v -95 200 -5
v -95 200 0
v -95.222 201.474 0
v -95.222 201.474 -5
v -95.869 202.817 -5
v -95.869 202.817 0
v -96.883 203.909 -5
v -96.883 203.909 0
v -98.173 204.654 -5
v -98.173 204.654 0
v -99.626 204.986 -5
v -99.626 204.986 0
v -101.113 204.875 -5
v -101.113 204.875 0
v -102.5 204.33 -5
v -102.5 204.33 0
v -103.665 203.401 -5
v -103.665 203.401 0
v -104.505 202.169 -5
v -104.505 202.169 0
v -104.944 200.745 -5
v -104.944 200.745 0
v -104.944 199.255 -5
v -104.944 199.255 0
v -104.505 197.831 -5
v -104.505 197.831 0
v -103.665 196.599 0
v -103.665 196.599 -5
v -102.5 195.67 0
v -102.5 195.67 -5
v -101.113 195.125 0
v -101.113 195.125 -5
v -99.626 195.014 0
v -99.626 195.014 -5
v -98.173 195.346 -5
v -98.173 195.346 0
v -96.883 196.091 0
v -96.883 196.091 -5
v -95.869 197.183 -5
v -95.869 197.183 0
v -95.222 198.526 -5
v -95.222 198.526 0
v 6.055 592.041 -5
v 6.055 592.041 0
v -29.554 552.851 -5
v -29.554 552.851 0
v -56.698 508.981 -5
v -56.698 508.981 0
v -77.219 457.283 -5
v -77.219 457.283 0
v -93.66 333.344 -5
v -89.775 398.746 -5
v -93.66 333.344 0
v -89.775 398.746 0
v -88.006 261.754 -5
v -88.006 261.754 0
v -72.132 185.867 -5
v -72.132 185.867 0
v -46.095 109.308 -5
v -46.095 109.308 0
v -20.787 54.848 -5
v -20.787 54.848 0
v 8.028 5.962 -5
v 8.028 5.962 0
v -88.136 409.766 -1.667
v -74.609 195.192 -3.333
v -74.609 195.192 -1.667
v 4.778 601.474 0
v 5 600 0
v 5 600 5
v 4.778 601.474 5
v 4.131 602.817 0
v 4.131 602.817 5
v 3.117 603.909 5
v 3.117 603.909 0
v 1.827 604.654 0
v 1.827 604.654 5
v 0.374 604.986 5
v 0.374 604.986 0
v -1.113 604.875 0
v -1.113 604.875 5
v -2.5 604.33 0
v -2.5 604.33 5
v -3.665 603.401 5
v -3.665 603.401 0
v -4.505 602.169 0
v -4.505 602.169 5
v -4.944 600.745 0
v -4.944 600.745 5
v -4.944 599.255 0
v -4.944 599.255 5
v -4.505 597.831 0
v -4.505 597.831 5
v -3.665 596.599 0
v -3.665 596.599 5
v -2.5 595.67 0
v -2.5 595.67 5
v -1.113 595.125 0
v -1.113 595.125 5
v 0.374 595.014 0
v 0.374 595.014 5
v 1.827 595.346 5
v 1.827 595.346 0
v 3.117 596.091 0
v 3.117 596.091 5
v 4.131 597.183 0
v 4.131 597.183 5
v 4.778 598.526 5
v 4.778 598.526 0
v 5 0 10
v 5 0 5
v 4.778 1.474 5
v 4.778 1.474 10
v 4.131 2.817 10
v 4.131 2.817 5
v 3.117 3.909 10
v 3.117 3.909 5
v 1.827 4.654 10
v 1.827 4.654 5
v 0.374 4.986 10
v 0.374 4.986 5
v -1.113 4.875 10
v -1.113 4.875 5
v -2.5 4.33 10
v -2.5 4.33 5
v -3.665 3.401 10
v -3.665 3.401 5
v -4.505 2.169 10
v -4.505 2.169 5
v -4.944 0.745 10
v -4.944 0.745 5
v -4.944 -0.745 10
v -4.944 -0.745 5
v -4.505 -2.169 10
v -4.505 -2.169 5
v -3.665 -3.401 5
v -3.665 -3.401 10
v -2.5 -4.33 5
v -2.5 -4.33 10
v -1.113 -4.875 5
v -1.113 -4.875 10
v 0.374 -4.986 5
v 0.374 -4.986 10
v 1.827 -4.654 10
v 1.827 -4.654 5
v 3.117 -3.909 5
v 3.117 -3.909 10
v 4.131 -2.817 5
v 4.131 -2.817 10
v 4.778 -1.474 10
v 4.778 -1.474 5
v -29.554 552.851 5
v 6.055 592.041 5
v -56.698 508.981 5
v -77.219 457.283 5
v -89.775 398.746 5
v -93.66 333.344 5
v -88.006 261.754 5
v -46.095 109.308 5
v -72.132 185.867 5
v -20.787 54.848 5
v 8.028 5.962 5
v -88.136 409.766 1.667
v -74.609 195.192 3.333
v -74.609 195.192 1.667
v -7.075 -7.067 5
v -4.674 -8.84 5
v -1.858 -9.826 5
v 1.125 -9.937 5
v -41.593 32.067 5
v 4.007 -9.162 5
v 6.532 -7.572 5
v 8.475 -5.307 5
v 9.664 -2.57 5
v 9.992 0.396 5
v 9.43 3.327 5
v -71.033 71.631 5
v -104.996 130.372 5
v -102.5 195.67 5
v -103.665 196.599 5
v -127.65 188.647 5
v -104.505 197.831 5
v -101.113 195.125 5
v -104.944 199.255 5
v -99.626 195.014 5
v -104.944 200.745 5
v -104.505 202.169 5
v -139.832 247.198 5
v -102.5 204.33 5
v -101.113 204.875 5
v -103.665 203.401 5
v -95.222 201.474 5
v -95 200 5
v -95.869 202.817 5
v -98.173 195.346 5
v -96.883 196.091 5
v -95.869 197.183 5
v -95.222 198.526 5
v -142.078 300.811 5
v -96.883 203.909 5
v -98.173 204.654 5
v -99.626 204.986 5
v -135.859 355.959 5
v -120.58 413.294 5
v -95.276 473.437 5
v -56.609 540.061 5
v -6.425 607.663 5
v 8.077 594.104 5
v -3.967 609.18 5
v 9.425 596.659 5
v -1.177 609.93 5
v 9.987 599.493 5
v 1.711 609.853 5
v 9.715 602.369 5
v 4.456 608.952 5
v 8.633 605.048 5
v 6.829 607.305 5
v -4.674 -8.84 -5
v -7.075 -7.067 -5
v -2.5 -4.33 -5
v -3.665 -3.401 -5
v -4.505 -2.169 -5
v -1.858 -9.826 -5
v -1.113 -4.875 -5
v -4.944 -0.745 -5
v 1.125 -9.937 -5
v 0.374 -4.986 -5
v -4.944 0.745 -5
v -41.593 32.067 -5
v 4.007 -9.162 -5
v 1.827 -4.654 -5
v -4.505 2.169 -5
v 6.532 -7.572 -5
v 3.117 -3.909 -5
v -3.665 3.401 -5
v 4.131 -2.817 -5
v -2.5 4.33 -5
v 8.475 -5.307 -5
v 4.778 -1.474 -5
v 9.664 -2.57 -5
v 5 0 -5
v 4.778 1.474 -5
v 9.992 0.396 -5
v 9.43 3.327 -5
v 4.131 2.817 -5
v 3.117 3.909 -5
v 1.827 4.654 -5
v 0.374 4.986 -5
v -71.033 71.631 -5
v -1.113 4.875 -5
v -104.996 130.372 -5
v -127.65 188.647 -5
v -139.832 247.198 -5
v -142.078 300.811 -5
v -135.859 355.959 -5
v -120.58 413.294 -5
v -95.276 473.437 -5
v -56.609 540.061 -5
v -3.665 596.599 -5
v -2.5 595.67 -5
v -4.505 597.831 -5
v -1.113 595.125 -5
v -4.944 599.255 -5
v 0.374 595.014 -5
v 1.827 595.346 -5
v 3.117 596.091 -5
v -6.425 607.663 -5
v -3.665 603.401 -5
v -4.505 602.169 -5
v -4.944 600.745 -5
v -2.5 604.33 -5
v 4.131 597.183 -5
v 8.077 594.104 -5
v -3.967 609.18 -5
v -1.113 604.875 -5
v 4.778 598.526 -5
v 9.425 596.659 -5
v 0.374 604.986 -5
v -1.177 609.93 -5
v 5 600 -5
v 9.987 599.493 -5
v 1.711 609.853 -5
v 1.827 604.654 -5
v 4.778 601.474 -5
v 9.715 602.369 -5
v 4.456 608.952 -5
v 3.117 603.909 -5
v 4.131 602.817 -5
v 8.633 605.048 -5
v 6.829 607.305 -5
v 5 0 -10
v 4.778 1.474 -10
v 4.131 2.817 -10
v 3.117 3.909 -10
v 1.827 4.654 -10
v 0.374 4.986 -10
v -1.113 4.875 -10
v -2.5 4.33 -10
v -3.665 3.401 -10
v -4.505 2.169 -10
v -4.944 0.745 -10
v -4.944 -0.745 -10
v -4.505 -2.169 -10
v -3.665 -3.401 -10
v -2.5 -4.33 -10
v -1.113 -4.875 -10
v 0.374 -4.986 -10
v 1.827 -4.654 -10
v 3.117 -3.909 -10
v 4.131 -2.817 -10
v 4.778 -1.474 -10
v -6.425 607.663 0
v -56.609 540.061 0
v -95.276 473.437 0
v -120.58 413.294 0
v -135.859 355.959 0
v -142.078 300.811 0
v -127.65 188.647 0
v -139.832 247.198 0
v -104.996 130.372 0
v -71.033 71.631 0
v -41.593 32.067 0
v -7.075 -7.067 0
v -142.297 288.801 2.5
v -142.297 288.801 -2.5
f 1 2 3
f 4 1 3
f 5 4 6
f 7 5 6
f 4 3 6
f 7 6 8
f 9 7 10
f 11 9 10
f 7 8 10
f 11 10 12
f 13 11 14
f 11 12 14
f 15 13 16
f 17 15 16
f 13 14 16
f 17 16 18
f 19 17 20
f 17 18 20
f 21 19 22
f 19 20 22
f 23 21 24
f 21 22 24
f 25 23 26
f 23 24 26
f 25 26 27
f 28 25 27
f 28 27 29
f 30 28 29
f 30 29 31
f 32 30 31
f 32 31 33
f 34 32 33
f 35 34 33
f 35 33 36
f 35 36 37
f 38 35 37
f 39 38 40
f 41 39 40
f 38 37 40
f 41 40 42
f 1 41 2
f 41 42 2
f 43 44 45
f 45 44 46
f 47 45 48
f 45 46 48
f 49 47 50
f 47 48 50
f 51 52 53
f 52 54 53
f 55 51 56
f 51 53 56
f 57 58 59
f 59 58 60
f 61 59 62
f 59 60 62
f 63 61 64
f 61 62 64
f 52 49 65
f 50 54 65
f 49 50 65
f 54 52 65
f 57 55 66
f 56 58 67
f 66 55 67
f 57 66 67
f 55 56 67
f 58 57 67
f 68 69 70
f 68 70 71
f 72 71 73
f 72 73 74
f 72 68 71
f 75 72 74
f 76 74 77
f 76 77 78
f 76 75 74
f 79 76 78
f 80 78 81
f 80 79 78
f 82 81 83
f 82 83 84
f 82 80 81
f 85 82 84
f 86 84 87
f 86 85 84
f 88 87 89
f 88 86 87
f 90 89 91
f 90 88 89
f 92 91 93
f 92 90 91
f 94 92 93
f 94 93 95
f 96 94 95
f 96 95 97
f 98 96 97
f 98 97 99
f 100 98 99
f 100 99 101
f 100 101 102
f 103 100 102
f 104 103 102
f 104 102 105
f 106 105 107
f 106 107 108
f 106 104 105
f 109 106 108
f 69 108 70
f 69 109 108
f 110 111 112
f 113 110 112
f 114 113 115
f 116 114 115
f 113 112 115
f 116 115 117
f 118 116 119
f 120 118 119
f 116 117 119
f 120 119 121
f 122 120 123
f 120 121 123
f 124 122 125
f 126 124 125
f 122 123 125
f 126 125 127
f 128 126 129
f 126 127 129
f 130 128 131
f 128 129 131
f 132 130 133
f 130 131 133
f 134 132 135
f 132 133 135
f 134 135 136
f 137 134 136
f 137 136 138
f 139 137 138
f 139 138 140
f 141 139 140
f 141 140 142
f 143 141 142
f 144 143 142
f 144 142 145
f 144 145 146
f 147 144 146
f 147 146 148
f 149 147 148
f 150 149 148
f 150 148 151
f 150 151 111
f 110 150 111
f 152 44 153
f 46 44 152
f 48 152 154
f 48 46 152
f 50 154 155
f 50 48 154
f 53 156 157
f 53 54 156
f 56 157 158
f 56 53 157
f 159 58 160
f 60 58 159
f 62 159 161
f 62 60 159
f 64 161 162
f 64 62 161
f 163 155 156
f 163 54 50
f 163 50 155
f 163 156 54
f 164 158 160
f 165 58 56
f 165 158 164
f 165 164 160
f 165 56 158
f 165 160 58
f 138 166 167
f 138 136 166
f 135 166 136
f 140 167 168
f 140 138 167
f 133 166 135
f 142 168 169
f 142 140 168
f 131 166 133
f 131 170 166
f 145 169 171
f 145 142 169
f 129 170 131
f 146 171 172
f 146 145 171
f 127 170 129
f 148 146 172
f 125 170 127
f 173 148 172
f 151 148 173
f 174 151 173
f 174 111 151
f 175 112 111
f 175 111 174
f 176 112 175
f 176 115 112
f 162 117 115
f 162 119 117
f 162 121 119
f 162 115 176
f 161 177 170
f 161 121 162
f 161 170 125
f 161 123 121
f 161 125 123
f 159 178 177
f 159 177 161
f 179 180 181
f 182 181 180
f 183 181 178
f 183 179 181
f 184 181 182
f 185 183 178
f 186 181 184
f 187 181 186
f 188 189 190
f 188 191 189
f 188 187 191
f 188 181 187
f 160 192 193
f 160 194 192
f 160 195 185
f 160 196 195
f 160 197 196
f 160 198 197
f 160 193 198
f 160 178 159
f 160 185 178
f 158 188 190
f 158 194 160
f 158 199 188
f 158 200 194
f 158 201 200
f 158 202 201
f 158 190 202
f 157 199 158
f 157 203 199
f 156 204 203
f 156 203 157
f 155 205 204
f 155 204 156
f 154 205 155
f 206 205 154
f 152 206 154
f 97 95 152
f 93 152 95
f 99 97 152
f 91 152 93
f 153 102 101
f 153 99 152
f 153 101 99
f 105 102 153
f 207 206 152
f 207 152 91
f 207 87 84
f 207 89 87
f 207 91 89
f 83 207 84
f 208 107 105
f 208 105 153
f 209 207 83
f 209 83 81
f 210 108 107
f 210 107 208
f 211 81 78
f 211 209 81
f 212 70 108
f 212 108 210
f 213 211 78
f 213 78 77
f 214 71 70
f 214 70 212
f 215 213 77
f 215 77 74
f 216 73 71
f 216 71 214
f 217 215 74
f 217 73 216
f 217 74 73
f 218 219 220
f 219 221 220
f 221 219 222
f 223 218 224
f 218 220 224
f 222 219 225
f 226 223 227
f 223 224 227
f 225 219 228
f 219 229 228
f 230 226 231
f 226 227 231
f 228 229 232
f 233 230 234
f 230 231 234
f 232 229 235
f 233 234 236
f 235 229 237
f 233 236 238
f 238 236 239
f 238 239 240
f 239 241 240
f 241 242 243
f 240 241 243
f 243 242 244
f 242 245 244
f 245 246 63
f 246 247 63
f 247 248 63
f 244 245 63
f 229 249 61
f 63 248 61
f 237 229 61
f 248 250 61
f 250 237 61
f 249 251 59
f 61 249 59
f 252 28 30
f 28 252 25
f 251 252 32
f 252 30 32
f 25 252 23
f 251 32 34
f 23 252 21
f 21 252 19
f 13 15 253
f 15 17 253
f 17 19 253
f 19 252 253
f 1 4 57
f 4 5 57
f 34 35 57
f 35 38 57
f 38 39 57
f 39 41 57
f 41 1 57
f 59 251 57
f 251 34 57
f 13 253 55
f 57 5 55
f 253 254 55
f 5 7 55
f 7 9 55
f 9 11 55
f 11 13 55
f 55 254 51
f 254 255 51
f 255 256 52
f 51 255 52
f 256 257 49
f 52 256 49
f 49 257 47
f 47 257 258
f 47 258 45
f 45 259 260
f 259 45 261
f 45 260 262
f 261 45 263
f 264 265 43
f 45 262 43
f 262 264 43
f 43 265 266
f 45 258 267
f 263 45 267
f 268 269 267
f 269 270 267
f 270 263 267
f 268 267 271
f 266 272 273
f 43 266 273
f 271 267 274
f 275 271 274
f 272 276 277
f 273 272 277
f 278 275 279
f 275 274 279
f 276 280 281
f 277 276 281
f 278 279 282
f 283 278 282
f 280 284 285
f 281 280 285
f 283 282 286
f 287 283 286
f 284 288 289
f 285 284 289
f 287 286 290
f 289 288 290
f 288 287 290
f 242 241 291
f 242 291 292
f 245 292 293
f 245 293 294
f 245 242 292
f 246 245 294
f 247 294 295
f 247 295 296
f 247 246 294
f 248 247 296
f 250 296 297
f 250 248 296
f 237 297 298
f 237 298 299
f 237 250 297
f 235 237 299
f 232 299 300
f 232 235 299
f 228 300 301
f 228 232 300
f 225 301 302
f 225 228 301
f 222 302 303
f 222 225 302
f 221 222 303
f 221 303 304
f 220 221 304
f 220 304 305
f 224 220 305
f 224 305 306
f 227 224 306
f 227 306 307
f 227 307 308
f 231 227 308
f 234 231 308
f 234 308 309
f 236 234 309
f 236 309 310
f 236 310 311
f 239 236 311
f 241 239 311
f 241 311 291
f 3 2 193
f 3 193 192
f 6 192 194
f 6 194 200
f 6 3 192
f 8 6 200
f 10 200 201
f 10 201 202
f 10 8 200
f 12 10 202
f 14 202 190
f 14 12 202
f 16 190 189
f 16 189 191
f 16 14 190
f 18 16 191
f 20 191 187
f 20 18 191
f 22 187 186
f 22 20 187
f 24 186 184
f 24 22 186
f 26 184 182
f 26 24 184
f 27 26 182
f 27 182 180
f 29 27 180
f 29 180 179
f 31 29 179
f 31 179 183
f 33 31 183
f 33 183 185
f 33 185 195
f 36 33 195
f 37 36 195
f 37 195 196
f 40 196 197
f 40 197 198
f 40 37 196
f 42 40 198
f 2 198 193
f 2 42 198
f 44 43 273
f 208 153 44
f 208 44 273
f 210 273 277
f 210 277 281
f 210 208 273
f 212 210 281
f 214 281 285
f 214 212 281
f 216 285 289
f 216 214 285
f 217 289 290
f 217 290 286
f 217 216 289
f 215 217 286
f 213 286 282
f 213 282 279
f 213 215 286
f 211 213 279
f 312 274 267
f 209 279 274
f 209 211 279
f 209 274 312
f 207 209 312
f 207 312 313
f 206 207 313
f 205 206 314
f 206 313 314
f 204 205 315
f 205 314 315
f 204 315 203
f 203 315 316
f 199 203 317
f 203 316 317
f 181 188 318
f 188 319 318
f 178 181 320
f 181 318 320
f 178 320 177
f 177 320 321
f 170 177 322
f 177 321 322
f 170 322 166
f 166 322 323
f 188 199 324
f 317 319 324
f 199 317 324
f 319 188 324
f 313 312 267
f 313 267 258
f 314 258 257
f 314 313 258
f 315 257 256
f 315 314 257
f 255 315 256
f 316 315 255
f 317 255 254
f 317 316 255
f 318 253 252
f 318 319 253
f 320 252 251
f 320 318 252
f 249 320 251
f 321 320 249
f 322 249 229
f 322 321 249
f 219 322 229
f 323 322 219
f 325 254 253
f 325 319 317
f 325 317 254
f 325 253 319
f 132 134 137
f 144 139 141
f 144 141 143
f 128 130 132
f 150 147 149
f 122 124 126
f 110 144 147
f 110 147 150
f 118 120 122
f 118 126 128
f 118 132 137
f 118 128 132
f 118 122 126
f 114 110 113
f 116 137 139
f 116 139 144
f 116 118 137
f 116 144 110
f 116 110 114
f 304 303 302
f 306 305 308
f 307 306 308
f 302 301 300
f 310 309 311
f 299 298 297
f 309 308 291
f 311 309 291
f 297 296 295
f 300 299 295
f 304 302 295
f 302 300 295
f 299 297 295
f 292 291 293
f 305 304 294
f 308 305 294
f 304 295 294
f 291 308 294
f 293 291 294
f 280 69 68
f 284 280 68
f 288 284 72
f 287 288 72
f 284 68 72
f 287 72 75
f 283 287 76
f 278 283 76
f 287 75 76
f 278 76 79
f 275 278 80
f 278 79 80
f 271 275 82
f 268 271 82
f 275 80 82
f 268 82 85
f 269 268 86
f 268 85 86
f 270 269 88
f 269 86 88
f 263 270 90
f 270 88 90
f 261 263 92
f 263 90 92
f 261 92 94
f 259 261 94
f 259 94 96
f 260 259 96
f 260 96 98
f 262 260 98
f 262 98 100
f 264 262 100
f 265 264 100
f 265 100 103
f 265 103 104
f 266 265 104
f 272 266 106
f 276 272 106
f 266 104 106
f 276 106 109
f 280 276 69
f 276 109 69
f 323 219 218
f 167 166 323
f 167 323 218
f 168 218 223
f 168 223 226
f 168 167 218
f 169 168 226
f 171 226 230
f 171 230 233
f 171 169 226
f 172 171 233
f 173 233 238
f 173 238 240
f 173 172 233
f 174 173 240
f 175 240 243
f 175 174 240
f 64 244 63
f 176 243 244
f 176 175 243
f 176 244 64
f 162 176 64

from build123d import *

# Parameters (mm, degrees)
SKETCH1_R           = 5
BOSS_EXTRUDE1_DEPTH = 5
SKETCH1_3_R         = 5
BOSS_EXTRUDE2_DEPTH = 10


with BuildPart() as part:
    # Sketch1 → Boss-Extrude1 (new body)
    with BuildSketch(Plane.XY):
        with BuildLine():
            ThreePointArc((-7.07496458, -7.067168895), (6.531960096, -7.571888622), (8.028425575, 5.961911001))
            add(Edge.make_bspline(
                [(6.054624404, 592.041261198), (-154.861931166, 445.129888812), (-96.296929143, 163.306236232), (8.028425575, 5.961911001)],
                knots=[0, 0, 0, 0, 1, 1, 1, 1], degree=3))
            ThreePointArc((6.054624404, 592.041261198), (7.812843537, 606.241752628), (-6.425366596, 607.662549452))
            add(Edge.make_bspline(
                [(-6.425366596, 607.662549452), (-277.843168438, 277.304372569), (-7.07496458, -7.067168895)],
                knots=[0, 0, 0, 1, 1, 1], degree=2))
        make_face()
        Circle(SKETCH1_R, mode=Mode.SUBTRACT)
        with Locations((-100, 200)):
            Circle(SKETCH1_R, mode=Mode.SUBTRACT)
        with Locations((0, 600)):
            Circle(SKETCH1_R, mode=Mode.SUBTRACT)
    boss_extrude1 = extrude(amount=BOSS_EXTRUDE1_DEPTH)

    # Sketch1<3> → Boss-Extrude2 (add)
    with BuildSketch(Plane.XY):
        Circle(SKETCH1_3_R)
    boss_extrude2 = extrude(amount=BOSS_EXTRUDE2_DEPTH)

    # Mirror1: Boss-Extrude1, Boss-Extrude2 across Front Plane
    add(boss_extrude1.mirror(Plane.XY))
    add(boss_extrude2.mirror(Plane.XY))


solid = part.part
